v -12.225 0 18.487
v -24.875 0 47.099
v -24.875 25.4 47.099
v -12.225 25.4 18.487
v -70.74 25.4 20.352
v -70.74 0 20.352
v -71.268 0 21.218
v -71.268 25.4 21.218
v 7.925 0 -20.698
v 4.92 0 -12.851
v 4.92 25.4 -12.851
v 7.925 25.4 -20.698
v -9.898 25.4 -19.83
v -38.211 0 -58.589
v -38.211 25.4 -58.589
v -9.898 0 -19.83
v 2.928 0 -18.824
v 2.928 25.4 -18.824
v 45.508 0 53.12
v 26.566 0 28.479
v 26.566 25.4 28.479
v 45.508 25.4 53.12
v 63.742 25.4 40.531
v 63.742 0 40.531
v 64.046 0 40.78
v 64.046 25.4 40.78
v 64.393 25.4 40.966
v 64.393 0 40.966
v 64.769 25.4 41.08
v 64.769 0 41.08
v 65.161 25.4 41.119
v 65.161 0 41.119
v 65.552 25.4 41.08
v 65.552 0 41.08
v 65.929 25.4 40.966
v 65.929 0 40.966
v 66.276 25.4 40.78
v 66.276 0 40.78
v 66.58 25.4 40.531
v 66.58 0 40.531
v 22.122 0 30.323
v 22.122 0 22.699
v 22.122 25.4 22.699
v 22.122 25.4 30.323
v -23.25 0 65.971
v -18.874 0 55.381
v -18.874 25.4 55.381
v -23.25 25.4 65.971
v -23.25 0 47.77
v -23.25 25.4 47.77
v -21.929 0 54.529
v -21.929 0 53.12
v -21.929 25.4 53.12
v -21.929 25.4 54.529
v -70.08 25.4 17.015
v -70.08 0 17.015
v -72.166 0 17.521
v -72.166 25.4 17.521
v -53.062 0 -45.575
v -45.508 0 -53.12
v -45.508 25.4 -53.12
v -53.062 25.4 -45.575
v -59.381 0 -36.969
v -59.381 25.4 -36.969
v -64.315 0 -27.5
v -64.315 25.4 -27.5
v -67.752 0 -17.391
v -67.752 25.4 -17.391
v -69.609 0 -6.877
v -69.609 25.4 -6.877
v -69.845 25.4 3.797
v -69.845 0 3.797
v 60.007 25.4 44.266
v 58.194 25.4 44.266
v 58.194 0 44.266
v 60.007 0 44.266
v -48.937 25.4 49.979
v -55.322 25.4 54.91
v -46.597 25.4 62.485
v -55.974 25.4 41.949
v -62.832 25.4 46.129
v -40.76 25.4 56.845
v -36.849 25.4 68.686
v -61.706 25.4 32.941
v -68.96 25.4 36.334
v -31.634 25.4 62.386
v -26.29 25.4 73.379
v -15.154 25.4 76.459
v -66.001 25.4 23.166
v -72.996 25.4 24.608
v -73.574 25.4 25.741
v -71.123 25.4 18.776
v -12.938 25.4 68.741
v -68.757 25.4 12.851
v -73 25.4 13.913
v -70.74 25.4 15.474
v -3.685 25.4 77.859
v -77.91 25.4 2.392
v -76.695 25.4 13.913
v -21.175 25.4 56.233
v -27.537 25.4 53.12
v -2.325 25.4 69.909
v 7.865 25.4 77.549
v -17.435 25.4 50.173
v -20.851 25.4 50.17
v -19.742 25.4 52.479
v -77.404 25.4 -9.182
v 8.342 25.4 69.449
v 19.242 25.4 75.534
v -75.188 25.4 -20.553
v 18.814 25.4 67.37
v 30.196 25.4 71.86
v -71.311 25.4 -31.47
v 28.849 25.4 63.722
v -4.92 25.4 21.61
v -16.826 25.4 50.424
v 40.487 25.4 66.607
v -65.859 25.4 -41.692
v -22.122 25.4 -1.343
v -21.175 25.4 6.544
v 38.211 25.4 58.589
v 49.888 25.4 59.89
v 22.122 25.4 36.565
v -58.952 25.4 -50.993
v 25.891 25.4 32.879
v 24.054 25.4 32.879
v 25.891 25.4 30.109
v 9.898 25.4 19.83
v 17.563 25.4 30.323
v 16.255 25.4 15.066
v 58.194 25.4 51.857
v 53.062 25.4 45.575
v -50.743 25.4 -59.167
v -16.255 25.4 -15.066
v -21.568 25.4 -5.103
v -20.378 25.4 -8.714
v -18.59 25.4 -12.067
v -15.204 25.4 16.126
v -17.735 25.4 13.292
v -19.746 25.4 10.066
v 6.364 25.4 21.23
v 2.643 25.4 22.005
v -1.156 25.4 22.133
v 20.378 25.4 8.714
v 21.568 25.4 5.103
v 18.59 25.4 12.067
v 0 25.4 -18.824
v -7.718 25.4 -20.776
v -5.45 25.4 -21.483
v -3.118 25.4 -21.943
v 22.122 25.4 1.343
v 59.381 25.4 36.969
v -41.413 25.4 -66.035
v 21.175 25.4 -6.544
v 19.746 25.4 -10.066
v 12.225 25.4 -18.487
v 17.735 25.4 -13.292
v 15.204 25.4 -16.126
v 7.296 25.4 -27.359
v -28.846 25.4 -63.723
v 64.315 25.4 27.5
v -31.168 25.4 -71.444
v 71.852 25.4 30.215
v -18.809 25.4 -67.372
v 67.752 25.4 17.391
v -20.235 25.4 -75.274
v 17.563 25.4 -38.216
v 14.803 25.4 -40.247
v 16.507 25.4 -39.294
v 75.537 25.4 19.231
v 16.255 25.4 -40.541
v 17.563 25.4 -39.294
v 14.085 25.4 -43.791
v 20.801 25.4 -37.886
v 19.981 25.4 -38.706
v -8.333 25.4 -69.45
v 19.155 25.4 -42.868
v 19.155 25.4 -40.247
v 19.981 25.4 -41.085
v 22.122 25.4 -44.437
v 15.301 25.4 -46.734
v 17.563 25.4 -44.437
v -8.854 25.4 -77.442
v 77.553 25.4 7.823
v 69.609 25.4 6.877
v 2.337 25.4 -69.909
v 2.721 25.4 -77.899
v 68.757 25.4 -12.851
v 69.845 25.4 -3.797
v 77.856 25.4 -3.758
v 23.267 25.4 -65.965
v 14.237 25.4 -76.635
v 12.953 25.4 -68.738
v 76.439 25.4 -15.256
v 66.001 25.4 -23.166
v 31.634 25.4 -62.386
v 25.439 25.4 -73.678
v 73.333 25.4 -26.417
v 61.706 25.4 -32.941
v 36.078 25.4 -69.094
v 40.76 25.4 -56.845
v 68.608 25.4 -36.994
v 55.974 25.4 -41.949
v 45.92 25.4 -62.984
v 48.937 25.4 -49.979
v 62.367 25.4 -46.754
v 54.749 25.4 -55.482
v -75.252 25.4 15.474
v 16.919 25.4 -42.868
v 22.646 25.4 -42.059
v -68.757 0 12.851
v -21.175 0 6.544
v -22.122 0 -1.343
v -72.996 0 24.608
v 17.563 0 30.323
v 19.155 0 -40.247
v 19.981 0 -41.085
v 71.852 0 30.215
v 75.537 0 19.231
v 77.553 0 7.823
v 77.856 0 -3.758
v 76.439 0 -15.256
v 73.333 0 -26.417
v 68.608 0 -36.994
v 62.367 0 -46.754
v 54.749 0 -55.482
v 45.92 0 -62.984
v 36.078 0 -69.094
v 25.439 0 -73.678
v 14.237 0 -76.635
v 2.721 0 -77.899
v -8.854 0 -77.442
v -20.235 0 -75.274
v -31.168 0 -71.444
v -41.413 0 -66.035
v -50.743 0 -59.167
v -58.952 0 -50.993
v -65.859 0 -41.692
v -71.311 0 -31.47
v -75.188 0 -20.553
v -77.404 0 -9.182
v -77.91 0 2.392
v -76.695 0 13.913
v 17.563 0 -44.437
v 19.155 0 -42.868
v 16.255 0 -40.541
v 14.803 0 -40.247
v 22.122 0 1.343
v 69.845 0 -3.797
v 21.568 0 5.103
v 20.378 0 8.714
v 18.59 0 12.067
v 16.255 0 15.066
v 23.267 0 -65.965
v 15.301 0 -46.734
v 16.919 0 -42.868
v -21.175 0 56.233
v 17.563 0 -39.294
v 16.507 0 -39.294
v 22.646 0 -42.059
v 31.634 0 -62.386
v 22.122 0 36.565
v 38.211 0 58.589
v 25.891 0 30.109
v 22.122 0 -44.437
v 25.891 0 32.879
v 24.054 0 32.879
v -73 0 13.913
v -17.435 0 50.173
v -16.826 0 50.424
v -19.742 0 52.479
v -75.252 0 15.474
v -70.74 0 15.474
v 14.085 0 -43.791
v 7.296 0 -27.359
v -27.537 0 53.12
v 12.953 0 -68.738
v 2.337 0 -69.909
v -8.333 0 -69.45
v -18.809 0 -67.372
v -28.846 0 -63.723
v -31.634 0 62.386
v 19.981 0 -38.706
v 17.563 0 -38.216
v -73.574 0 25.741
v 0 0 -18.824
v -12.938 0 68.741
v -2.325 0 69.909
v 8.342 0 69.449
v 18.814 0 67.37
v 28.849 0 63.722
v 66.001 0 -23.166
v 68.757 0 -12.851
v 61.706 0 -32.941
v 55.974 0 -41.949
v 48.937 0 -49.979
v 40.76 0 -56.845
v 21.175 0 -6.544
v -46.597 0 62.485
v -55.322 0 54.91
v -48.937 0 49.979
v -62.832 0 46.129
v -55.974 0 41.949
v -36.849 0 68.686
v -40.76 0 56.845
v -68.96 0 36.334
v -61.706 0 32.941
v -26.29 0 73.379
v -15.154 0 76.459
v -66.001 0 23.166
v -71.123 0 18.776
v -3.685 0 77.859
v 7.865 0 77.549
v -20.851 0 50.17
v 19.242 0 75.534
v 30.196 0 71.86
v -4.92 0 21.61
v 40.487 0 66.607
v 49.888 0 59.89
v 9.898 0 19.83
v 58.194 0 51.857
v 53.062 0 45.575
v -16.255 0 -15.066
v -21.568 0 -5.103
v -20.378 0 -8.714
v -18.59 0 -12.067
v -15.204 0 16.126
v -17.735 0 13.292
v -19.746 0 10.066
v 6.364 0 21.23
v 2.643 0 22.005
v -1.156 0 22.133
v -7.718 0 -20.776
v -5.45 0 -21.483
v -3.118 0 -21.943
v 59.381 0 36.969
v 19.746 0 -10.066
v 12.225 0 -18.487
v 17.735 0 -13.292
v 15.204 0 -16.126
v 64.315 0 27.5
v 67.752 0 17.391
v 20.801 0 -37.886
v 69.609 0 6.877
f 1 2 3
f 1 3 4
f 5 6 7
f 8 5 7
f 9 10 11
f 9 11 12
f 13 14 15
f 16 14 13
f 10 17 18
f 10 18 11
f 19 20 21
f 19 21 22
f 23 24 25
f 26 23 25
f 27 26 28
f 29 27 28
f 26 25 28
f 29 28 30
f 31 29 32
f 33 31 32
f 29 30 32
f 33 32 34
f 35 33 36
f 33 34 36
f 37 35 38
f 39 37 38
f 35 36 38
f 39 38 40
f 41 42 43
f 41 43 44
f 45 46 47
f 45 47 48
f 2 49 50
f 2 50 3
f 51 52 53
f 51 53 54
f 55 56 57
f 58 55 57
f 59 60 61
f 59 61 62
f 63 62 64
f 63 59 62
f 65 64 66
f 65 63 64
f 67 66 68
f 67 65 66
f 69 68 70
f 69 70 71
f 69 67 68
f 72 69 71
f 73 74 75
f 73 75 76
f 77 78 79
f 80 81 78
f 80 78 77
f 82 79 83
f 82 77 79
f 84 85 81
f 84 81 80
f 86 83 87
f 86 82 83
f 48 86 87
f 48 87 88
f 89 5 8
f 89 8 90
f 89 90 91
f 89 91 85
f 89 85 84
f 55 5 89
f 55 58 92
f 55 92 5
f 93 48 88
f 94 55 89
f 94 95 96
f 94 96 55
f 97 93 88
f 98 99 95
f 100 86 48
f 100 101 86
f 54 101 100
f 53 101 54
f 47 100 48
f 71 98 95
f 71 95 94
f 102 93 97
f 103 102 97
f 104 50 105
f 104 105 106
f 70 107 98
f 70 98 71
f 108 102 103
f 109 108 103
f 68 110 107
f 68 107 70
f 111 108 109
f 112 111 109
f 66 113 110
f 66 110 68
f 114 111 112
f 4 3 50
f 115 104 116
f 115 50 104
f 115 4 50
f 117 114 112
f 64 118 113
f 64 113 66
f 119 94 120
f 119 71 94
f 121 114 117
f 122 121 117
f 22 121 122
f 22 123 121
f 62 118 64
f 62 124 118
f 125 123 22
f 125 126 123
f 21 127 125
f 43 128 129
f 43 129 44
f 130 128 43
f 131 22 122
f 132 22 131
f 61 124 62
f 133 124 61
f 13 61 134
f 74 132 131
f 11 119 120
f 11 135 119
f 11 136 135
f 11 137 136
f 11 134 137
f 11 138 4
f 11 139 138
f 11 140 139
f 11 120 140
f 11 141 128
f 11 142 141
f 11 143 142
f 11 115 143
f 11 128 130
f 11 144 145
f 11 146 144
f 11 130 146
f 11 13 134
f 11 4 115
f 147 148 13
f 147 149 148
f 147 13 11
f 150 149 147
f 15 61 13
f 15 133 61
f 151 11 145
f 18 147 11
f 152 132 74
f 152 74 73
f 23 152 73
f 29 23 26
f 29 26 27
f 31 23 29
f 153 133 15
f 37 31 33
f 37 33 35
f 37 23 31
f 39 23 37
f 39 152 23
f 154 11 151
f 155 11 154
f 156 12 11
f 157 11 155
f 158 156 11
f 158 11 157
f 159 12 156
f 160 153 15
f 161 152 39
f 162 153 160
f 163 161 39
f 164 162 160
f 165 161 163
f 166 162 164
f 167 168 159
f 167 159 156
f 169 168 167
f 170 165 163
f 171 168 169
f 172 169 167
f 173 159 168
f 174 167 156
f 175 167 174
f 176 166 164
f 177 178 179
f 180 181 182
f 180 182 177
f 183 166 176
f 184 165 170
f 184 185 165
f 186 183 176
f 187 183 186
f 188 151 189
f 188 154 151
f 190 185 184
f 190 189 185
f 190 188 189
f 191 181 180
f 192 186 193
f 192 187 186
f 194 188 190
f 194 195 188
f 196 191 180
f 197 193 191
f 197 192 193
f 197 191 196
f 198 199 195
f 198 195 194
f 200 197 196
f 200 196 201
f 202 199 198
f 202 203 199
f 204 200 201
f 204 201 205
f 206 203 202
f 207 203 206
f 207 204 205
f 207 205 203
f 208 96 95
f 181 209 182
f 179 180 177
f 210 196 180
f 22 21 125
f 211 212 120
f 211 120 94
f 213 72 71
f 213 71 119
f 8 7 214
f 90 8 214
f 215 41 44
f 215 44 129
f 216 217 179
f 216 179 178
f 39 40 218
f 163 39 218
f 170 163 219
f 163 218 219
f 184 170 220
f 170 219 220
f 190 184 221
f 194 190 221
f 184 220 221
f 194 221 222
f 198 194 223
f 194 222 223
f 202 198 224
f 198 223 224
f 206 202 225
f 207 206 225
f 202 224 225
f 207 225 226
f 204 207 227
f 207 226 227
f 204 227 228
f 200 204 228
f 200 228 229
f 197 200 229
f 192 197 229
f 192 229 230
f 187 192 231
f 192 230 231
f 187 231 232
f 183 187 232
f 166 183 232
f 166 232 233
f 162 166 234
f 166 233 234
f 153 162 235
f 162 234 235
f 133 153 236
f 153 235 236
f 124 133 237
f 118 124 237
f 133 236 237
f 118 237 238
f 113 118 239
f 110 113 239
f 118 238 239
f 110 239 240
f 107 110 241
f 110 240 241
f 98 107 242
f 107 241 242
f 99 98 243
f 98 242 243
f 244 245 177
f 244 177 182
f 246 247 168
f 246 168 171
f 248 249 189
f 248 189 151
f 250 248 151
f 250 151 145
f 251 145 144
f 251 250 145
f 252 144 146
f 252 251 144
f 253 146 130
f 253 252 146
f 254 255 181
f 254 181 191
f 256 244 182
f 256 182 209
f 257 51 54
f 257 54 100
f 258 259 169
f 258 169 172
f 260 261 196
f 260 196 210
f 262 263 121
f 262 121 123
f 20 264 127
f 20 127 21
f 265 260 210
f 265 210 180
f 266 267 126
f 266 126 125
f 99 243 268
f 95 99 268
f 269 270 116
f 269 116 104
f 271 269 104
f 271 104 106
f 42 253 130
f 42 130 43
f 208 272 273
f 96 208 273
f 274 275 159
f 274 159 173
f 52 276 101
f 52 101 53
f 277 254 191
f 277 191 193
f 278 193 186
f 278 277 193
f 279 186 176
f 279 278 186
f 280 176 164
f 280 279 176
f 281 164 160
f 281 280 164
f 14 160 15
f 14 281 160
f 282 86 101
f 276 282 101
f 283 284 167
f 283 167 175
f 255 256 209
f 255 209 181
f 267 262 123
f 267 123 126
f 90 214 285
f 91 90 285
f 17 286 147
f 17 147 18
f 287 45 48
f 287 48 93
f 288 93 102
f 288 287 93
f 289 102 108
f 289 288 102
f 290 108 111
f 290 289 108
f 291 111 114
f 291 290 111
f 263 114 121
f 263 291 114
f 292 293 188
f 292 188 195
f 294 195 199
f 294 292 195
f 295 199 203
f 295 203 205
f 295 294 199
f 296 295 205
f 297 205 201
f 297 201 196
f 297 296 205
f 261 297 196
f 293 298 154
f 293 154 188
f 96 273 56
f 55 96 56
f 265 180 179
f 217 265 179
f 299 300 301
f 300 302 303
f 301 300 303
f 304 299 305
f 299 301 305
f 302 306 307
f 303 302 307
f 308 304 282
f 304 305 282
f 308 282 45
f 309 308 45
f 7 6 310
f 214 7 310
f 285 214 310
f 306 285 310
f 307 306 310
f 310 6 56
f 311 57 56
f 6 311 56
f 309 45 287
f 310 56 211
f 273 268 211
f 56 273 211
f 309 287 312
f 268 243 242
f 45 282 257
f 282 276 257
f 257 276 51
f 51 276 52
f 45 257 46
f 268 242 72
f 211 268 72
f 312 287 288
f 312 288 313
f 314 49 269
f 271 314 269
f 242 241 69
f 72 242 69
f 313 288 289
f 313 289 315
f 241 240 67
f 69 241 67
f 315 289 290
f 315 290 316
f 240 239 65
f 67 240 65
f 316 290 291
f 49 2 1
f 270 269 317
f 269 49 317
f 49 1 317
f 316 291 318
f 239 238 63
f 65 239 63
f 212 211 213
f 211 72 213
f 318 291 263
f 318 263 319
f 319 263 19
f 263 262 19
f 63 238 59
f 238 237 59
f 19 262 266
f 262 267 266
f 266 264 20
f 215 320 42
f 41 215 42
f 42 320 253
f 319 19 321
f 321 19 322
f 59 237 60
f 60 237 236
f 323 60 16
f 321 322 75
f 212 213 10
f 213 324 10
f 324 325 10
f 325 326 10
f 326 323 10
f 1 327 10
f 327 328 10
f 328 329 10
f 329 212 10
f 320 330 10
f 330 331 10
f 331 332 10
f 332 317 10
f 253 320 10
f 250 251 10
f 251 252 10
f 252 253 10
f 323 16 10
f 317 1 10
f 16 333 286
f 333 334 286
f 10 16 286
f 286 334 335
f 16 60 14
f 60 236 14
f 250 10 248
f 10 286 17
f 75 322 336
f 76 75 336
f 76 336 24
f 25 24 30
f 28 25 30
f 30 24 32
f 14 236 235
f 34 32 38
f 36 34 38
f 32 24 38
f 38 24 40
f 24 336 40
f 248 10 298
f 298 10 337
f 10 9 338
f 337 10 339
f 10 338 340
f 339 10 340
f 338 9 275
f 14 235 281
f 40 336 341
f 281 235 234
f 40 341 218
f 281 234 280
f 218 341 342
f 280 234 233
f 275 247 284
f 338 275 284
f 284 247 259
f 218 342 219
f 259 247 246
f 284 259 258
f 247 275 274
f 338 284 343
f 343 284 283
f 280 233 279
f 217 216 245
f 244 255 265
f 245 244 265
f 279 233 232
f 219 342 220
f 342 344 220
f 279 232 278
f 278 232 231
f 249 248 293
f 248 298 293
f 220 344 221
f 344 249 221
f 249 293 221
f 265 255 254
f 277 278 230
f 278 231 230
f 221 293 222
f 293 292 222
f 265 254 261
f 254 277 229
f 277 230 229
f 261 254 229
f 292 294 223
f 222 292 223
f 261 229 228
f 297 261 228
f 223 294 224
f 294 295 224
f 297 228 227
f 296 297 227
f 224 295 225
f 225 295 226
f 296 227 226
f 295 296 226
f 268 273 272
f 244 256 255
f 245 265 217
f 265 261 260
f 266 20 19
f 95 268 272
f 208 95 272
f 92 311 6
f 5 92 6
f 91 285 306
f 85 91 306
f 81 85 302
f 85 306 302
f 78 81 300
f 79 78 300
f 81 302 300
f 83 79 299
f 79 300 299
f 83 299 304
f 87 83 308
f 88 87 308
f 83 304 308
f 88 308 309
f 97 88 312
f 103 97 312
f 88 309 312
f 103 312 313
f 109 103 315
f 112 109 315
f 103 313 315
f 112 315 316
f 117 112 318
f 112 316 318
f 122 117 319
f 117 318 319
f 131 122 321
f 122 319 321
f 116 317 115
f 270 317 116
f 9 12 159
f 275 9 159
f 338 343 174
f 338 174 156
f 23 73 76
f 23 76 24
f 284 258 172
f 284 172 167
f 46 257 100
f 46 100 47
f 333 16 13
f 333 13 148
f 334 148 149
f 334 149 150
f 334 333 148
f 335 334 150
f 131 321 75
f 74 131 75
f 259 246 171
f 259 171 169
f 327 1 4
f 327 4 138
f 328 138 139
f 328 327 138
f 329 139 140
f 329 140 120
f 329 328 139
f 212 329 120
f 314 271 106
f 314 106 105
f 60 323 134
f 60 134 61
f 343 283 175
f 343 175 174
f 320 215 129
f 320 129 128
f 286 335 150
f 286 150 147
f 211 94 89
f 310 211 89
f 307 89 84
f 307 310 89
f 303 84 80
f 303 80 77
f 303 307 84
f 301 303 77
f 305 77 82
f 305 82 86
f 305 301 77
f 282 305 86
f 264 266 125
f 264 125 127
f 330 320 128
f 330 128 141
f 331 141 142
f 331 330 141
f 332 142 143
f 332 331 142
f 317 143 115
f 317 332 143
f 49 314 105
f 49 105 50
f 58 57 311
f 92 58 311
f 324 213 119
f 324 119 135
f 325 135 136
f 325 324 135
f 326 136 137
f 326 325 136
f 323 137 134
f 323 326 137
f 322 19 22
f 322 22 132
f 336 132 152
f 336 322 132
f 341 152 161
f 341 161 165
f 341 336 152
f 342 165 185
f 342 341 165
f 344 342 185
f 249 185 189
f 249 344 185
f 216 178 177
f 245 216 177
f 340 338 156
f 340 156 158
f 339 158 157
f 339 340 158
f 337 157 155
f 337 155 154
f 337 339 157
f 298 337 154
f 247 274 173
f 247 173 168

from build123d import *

# Parameters (mm, degrees)
SKETCH1_R           = 69.948062861
BOSS_EXTRUDE1_DEPTH = 25.4
BOSS_EXTRUDE2_DEPTH = 25.4


with BuildPart() as part:
    # Sketch1 → Boss-Extrude1 (new body)
    with BuildSketch(Plane(origin=(0, 0, 0), x_dir=(1, 0, 0), z_dir=(0, 1, 0))):
        with BuildLine():
            ThreePointArc((63.74187476, -40.530752622), (65.16096079, -41.118557302), (66.58004682, -40.530752622))
            ThreePointArc((66.58004682, -40.530752622), (14.23733744, 76.635127489), (-76.694663108, -13.913058378))
            Line((-76.694663108, -13.913058378), (-73.000086536, -13.913058378))
            Line((-73.000086536, -13.913058378), (-75.252390768, -15.474368763))
            Line((-75.252390768, -15.474368763), (-70.740426062, -15.474368763))
            Line((-70.740426062, -15.474368763), (-70.080138544, -17.015039639))
            Line((-70.080138544, -17.015039639), (-72.166015782, -17.521478191))
            Line((-72.166015782, -17.521478191), (-71.123077163, -18.775806353))
            Line((-71.123077163, -18.775806353), (-70.740426062, -20.351838073))
            Line((-70.740426062, -20.351838073), (-71.268418719, -21.218426764))
            Line((-71.268418719, -21.218426764), (-72.996408415, -24.608346096))
            Line((-72.996408415, -24.608346096), (-73.573552306, -25.740569997))
            ThreePointArc((-73.573552306, -25.740569997), (-15.15436006, -76.459073457), (58.193519931, -51.857099617))
            Line((58.193519931, -51.857099617), (58.193519931, -44.265552602))
            Line((58.193519931, -44.265552602), (60.00707478, -44.265552602))
            Line((60.00707478, -44.265552602), (63.74187476, -40.530752622))
        make_face()
        with Locations(Location((0, 0, 0), (0, 0, 90))):
            Circle(SKETCH1_R, mode=Mode.SUBTRACT)
    extrude(amount=BOSS_EXTRUDE1_DEPTH)

    # Sketch2 → Boss-Extrude2 (add)
    with BuildSketch(Plane.XZ):
        with BuildLine():
            Line((16.91938422, -42.867763876), (15.301396265, -46.734397981))
            Line((15.301396265, -46.734397981), (23.266647688, -65.965101405))
            ThreePointArc((23.266647688, -65.965101405), (27.508582432, -64.311813771), (31.633980927, -62.386078164))
            Line((31.633980927, -62.386078164), (22.646440609, -42.05853708))
            Line((22.646440609, -42.05853708), (22.122487474, -44.43690451))
            Line((22.122487474, -44.43690451), (19.98105683, -41.085378254))
            Line((19.98105683, -41.085378254), (19.154678805, -40.246982073))
            Line((19.154678805, -40.246982073), (19.154678805, -42.867763876))
            Line((19.154678805, -42.867763876), (17.562717892, -44.43690451))
            Line((17.562717892, -44.43690451), (16.91938422, -42.867763876))
        make_face()
        with BuildLine():
            Line((7.295677294, -27.358886688), (14.085059503, -43.790609078))
            Line((14.085059503, -43.790609078), (14.802816622, -40.246982073))
            Line((14.802816622, -40.246982073), (16.254758128, -40.541070969))
            Line((16.254758128, -40.541070969), (16.507439862, -39.293560089))
            Line((16.507439862, -39.293560089), (17.562717892, -39.293560089))
            Line((17.562717892, -39.293560089), (17.562717892, -38.21621684))
            Line((17.562717892, -38.21621684), (19.98105683, -38.7060483))
            Line((19.98105683, -38.7060483), (20.801456059, -37.88564907))
            Line((20.801456059, -37.88564907), (12.224600097, -18.486972039))
            ThreePointArc((12.224600097, -18.486972039), (17.735408563, -13.291511043), (21.175132345, -6.543909602))
            Line((21.175132345, -6.543909602), (68.757486976, -12.850660789))
            ThreePointArc((68.757486976, -12.850660789), (69.448887589, -8.341673136), (69.844918996, -3.797207976))
            Line((69.844918996, -3.797207976), (22.122487474, 1.343328216))
            ThreePointArc((22.122487474, 1.343328216), (20.3784905, 8.713558841), (16.254758128, 15.066247738))
            Line((16.254758128, 15.066247738), (22.122487474, 22.699365292))
            Line((22.122487474, 22.699365292), (22.122487474, 30.322912753))
            Line((22.122487474, 30.322912753), (17.562717892, 30.322912753))
            Line((17.562717892, 30.322912753), (9.897887376, 19.830300255))
            ThreePointArc((9.897887376, 19.830300255), (2.643081937, 22.005069884), (-4.920374217, 21.610157341))
            Line((-4.920374217, 21.610157341), (-16.826086698, 50.424467144))
            Line((-16.826086698, 50.424467144), (-17.435403285, 50.17270515))
            Line((-17.435403285, 50.17270515), (-19.742011126, 52.479312991))
            Line((-19.742011126, 52.479312991), (-20.850502701, 50.169534038))
            Line((-20.850502701, 50.169534038), (-23.249744789, 47.77029195))
            Line((-23.249744789, 47.77029195), (-24.874918704, 47.098790412))
            Line((-24.874918704, 47.098790412), (-12.224600097, 18.486972039))
            ThreePointArc((-12.224600097, 18.486972039), (-17.735408563, 13.291511043), (-21.175132345, 6.543909602))
            Line((-21.175132345, 6.543909602), (-68.757486976, 12.850660789))
            ThreePointArc((-68.757486976, 12.850660789), (-69.448887589, 8.341673136), (-69.844918996, 3.797207976))
            Line((-69.844918996, 3.797207976), (-22.122487474, -1.343328216))
            ThreePointArc((-22.122487474, -1.343328216), (-20.3784905, -8.713558841), (-16.254758128, -15.066247738))
            Line((-16.254758128, -15.066247738), (-45.507742187, -53.120400027))
            ThreePointArc((-45.507742187, -53.120400027), (-41.94854464, -55.973664348), (-38.210938069, -58.588870188))
            Line((-38.210938069, -58.588870188), (-9.897887376, -19.830300255))
            ThreePointArc((-9.897887376, -19.830300255), (-6.593278337, -21.159812463), (-3.118363368, -21.942761737))
            Line((-3.118363368, -21.942761737), (0, -18.824398369))
            Line((0, -18.824398369), (2.927922909, -18.824398369))
            Line((2.927922909, -18.824398369), (4.920374217, -12.850660789))
            Line((4.920374217, -12.850660789), (7.924997395, -20.697908083))
            Line((7.924997395, -20.697908083), (7.295677294, -27.358886688))
        make_face()
        with BuildLine():
            ThreePointArc((-23.249744789, 65.971060816), (-27.500342949, 64.315337484), (-31.633980927, 62.386078164))
            Line((-31.633980927, 62.386078164), (-27.537289867, 53.120400027))
            Line((-27.537289867, 53.120400027), (-21.929290512, 53.120400027))
            Line((-21.929290512, 53.120400027), (-21.929290512, 54.528885617))
            Line((-21.929290512, 54.528885617), (-21.175132345, 56.232852652))
            Line((-21.175132345, 56.232852652), (-18.874010019, 55.380869134))
            Line((-18.874010019, 55.380869134), (-23.249744789, 65.971060816))
        make_face()
        with BuildLine():
            Line((26.56555805, 28.479195616), (45.507742187, 53.120400027))
            ThreePointArc((45.507742187, 53.120400027), (41.94854464, 55.973664348), (38.210938069, 58.588870188))
            Line((38.210938069, 58.588870188), (22.122487474, 36.564915784))
            Line((22.122487474, 36.564915784), (24.054412722, 32.87896942))
            Line((24.054412722, 32.87896942), (25.891298269, 32.87896942))
            Line((25.891298269, 32.87896942), (25.891298269, 30.109133149))
            Line((25.891298269, 30.109133149), (26.56555805, 28.479195616))
        make_face()
    extrude(amount=-BOSS_EXTRUDE2_DEPTH)


solid = part.part
